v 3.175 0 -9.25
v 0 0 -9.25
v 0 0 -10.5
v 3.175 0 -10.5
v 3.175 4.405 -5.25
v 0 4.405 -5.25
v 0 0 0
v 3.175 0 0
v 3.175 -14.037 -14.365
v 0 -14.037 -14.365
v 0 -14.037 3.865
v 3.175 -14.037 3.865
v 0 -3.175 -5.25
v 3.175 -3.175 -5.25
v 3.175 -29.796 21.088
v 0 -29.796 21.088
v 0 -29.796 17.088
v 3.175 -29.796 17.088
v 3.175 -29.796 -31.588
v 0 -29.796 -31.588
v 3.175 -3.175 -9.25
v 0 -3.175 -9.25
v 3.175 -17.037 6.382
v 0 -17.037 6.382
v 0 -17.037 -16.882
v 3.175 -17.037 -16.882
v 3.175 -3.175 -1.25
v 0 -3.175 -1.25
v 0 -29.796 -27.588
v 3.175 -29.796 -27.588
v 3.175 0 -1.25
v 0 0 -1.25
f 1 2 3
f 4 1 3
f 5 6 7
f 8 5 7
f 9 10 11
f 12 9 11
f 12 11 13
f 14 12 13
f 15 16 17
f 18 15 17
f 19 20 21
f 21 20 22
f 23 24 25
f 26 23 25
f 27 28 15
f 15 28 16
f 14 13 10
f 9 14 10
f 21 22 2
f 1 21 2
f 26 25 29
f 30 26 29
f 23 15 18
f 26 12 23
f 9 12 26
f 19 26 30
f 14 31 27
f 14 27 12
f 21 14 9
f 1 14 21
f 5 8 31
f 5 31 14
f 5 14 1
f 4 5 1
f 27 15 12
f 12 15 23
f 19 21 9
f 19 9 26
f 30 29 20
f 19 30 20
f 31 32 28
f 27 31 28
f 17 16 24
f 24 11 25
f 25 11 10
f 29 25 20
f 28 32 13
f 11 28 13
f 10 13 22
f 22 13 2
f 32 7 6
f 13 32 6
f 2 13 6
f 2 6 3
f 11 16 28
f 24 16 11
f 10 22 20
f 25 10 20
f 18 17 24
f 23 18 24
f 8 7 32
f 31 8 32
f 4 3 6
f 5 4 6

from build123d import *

# Parameters (mm, degrees)
BOSS_EXTRUDE2_DEPTH = 3.175


with BuildPart() as part:
    # Sketch1 → Boss-Extrude2 (new body)
    with BuildSketch(Plane(origin=(0, 0, 0), x_dir=(0, 0, -1), z_dir=(1, 0, 0))):
        Polygon((0, 0), (1.25, 0), (1.25, -3.175), (-21.087781289, -29.796131102), (-17.087781289, -29.796131102), (-6.381931526, -17.037396185), (16.881931526, -17.037396185), (27.587781289, -29.796131102), (31.587781289, -29.796131102), (9.25, -3.175), (9.25, 0), (10.5, 0), (5.25, 4.405273064), align=None)
        Polygon((5.25, -3.175), (14.364632633, -14.037396185), (-3.864632633, -14.037396185), align=None, mode=Mode.SUBTRACT)
    extrude(amount=BOSS_EXTRUDE2_DEPTH)


solid = part.part
